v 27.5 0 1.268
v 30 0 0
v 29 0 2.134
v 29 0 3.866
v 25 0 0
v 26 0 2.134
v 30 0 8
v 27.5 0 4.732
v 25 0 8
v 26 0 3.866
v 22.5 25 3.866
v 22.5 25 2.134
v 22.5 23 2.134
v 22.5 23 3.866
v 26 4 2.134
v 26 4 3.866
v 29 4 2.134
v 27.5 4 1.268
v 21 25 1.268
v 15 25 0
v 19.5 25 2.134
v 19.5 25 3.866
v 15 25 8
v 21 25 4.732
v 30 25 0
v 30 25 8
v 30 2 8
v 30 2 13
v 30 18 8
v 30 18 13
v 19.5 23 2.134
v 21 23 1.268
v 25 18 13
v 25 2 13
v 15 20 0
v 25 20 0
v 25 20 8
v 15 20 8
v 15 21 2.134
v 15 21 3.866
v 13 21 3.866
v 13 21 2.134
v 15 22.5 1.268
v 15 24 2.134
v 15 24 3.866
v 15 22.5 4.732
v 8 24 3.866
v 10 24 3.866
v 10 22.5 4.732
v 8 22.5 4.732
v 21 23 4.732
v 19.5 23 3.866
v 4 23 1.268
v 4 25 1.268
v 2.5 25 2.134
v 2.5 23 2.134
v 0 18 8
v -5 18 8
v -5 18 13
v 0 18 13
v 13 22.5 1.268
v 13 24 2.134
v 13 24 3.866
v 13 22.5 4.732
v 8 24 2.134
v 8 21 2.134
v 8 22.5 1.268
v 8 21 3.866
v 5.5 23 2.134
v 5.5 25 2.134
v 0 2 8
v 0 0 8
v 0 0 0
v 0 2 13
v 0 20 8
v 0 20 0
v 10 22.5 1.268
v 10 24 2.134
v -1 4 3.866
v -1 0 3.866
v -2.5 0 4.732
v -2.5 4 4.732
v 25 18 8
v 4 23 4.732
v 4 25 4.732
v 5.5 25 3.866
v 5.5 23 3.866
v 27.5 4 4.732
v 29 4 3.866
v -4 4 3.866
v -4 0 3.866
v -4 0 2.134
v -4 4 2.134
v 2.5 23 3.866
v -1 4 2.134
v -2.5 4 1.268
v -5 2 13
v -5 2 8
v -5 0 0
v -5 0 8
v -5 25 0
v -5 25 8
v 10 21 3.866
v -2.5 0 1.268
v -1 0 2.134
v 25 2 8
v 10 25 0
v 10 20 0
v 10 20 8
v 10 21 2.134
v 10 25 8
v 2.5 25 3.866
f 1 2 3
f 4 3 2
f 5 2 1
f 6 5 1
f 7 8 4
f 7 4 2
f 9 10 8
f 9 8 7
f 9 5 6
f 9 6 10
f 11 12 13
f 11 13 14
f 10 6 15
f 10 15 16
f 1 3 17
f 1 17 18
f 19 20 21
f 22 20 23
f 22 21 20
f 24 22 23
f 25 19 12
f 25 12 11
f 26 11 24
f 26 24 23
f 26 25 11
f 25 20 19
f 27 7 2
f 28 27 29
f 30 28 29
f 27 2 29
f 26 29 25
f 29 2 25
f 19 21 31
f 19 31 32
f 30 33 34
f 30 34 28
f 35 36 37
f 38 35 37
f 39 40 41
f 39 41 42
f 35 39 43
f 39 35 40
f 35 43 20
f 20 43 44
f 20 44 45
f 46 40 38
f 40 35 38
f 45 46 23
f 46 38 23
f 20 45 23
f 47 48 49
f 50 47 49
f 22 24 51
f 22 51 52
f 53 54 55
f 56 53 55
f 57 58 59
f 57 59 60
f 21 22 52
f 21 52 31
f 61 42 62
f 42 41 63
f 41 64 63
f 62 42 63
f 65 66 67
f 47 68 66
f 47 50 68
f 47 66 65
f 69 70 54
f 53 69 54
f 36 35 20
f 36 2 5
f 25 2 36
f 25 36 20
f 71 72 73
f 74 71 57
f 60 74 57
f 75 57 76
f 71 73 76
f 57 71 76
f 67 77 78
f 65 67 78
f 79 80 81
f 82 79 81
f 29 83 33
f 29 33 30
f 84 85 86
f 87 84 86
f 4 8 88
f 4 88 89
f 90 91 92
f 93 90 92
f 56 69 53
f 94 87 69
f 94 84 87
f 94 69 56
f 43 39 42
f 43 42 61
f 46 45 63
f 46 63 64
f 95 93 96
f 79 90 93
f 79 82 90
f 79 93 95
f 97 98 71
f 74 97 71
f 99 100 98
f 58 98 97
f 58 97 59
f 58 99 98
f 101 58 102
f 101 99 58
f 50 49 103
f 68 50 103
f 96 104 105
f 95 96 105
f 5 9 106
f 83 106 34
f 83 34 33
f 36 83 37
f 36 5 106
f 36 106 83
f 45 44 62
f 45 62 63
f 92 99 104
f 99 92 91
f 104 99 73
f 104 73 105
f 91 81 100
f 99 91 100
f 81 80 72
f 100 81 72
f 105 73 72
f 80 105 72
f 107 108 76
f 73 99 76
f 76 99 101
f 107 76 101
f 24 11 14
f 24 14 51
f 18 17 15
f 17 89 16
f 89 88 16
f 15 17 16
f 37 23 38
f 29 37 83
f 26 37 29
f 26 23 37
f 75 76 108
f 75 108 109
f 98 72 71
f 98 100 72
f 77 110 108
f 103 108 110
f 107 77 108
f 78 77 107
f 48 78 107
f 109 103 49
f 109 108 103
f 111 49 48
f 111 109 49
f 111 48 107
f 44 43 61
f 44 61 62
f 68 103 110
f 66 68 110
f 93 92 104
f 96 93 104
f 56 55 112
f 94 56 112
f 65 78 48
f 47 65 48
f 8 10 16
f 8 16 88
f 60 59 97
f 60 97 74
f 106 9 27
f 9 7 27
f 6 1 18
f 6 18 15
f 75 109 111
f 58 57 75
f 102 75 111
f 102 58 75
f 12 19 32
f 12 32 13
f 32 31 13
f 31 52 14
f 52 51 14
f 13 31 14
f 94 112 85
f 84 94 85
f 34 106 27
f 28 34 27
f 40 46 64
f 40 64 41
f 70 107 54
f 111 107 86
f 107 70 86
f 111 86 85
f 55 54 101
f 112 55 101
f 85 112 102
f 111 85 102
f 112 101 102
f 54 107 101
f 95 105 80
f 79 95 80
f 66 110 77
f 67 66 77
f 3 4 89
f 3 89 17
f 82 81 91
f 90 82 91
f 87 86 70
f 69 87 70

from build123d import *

# Parameters (mm, degrees)
F0_W      = 20
F0_H      = 8
F0_W_2    = 5
F1_DEPTH  = 5
F3_DEPTH  = 4
F4_DEPTH  = 10
F6_DEPTH  = 2
F8_DEPTH  = 2
F11_DEPTH = 4
F12_W     = 5
F12_H     = 18
F13_DEPTH = 5
F14_W     = 5
F14_H     = 18
F15_DEPTH = 5
F16_DEPTH = 2
F17_DEPTH = 2


with BuildPart() as f1:
    # F0 (on Right) → F1 (new body)
    with BuildSketch(Plane.YZ):
        with Locations((10, 4)):
            Rectangle(F0_W, F0_H)
        with Locations((22.5, 4)):
            Rectangle(F0_W_2, F0_H)
    extrude(amount=-F1_DEPTH)

    # F2 (on face) → F3 (cut)
    with BuildSketch(Plane.XZ):
        Polygon((-4, 3.8660254038), (-4, 2.1339745962), (-2.5, 1.2679491924), (-1, 2.1339745962), (-1, 3.8660254038), (-2.5, 4.7320508076), align=None)
    extrude(amount=-F3_DEPTH, mode=Mode.SUBTRACT)

    # F0 (on Right) → F4 (join)
    with BuildSketch(Plane.YZ):
        with Locations((22.5, 4)):
            Rectangle(F0_W_2, F0_H)
    extrude(amount=F4_DEPTH)

    # F5 (on face) → F6 (cut)
    with BuildSketch(Plane.YZ.offset(10)):
        Polygon((21, 3.8660254038), (21, 2.1339745962), (22.5, 1.2679491924), (24, 2.1339745962), (24, 3.8660254038), (22.5, 4.7320508076), align=None)
    extrude(amount=-F6_DEPTH, mode=Mode.SUBTRACT)

    # F7 (on face) → F8 (cut)
    with BuildSketch(Plane(origin=(0, 25, 0), x_dir=(-1, 0, 0), z_dir=(0, 1, 0))):
        Polygon((-5.5, 3.8660254038), (-5.5, 2.1339745962), (-4, 1.2679491924), (-2.5, 2.1339745962), (-2.5, 3.8660254038), (-4, 4.7320508076), align=None)
    extrude(amount=-F8_DEPTH, mode=Mode.SUBTRACT)


with BuildPart() as f10_1:
    # F10: instance of F1
    add(f1.part.mirror(Plane.YZ.offset(12.5)))

    # F11 (add): a face of the model
    f11_faces = [f10_1.faces().sort_by_distance(p)[0] for p in [
        (17, 22.5, 3),
    ]]
    extrude(f11_faces, amount=F11_DEPTH)

    # F14 (on face) → F15 (join)
    with BuildSketch(Plane.XY.offset(8)):
        with Locations((27.5, 11)):
            Rectangle(F14_W, F14_H)
    extrude(amount=F15_DEPTH)

    # F17 (cut): a face of the model
    f17_faces = [f10_1.faces().sort_by_distance(p)[0] for p in [
        (27.5, 20, 10.5),
    ]]
    extrude(f17_faces, amount=-F17_DEPTH, mode=Mode.SUBTRACT)


with BuildPart() as f1_1:
    add(f1.part)

    # F12 (on face) → F13 (join)
    with BuildSketch(Plane.XY.offset(8)):
        with Locations((-2.5, 11)):
            Rectangle(F12_W, F12_H)
    extrude(amount=F13_DEPTH)

    # F16 (cut): a face of the model
    f16_faces = [f1_1.faces().sort_by_distance(p)[0] for p in [
        (-2.5, 20, 10.5),
    ]]
    extrude(f16_faces, amount=-F16_DEPTH, mode=Mode.SUBTRACT)


solid = Compound([f10_1.part, f1_1.part])
